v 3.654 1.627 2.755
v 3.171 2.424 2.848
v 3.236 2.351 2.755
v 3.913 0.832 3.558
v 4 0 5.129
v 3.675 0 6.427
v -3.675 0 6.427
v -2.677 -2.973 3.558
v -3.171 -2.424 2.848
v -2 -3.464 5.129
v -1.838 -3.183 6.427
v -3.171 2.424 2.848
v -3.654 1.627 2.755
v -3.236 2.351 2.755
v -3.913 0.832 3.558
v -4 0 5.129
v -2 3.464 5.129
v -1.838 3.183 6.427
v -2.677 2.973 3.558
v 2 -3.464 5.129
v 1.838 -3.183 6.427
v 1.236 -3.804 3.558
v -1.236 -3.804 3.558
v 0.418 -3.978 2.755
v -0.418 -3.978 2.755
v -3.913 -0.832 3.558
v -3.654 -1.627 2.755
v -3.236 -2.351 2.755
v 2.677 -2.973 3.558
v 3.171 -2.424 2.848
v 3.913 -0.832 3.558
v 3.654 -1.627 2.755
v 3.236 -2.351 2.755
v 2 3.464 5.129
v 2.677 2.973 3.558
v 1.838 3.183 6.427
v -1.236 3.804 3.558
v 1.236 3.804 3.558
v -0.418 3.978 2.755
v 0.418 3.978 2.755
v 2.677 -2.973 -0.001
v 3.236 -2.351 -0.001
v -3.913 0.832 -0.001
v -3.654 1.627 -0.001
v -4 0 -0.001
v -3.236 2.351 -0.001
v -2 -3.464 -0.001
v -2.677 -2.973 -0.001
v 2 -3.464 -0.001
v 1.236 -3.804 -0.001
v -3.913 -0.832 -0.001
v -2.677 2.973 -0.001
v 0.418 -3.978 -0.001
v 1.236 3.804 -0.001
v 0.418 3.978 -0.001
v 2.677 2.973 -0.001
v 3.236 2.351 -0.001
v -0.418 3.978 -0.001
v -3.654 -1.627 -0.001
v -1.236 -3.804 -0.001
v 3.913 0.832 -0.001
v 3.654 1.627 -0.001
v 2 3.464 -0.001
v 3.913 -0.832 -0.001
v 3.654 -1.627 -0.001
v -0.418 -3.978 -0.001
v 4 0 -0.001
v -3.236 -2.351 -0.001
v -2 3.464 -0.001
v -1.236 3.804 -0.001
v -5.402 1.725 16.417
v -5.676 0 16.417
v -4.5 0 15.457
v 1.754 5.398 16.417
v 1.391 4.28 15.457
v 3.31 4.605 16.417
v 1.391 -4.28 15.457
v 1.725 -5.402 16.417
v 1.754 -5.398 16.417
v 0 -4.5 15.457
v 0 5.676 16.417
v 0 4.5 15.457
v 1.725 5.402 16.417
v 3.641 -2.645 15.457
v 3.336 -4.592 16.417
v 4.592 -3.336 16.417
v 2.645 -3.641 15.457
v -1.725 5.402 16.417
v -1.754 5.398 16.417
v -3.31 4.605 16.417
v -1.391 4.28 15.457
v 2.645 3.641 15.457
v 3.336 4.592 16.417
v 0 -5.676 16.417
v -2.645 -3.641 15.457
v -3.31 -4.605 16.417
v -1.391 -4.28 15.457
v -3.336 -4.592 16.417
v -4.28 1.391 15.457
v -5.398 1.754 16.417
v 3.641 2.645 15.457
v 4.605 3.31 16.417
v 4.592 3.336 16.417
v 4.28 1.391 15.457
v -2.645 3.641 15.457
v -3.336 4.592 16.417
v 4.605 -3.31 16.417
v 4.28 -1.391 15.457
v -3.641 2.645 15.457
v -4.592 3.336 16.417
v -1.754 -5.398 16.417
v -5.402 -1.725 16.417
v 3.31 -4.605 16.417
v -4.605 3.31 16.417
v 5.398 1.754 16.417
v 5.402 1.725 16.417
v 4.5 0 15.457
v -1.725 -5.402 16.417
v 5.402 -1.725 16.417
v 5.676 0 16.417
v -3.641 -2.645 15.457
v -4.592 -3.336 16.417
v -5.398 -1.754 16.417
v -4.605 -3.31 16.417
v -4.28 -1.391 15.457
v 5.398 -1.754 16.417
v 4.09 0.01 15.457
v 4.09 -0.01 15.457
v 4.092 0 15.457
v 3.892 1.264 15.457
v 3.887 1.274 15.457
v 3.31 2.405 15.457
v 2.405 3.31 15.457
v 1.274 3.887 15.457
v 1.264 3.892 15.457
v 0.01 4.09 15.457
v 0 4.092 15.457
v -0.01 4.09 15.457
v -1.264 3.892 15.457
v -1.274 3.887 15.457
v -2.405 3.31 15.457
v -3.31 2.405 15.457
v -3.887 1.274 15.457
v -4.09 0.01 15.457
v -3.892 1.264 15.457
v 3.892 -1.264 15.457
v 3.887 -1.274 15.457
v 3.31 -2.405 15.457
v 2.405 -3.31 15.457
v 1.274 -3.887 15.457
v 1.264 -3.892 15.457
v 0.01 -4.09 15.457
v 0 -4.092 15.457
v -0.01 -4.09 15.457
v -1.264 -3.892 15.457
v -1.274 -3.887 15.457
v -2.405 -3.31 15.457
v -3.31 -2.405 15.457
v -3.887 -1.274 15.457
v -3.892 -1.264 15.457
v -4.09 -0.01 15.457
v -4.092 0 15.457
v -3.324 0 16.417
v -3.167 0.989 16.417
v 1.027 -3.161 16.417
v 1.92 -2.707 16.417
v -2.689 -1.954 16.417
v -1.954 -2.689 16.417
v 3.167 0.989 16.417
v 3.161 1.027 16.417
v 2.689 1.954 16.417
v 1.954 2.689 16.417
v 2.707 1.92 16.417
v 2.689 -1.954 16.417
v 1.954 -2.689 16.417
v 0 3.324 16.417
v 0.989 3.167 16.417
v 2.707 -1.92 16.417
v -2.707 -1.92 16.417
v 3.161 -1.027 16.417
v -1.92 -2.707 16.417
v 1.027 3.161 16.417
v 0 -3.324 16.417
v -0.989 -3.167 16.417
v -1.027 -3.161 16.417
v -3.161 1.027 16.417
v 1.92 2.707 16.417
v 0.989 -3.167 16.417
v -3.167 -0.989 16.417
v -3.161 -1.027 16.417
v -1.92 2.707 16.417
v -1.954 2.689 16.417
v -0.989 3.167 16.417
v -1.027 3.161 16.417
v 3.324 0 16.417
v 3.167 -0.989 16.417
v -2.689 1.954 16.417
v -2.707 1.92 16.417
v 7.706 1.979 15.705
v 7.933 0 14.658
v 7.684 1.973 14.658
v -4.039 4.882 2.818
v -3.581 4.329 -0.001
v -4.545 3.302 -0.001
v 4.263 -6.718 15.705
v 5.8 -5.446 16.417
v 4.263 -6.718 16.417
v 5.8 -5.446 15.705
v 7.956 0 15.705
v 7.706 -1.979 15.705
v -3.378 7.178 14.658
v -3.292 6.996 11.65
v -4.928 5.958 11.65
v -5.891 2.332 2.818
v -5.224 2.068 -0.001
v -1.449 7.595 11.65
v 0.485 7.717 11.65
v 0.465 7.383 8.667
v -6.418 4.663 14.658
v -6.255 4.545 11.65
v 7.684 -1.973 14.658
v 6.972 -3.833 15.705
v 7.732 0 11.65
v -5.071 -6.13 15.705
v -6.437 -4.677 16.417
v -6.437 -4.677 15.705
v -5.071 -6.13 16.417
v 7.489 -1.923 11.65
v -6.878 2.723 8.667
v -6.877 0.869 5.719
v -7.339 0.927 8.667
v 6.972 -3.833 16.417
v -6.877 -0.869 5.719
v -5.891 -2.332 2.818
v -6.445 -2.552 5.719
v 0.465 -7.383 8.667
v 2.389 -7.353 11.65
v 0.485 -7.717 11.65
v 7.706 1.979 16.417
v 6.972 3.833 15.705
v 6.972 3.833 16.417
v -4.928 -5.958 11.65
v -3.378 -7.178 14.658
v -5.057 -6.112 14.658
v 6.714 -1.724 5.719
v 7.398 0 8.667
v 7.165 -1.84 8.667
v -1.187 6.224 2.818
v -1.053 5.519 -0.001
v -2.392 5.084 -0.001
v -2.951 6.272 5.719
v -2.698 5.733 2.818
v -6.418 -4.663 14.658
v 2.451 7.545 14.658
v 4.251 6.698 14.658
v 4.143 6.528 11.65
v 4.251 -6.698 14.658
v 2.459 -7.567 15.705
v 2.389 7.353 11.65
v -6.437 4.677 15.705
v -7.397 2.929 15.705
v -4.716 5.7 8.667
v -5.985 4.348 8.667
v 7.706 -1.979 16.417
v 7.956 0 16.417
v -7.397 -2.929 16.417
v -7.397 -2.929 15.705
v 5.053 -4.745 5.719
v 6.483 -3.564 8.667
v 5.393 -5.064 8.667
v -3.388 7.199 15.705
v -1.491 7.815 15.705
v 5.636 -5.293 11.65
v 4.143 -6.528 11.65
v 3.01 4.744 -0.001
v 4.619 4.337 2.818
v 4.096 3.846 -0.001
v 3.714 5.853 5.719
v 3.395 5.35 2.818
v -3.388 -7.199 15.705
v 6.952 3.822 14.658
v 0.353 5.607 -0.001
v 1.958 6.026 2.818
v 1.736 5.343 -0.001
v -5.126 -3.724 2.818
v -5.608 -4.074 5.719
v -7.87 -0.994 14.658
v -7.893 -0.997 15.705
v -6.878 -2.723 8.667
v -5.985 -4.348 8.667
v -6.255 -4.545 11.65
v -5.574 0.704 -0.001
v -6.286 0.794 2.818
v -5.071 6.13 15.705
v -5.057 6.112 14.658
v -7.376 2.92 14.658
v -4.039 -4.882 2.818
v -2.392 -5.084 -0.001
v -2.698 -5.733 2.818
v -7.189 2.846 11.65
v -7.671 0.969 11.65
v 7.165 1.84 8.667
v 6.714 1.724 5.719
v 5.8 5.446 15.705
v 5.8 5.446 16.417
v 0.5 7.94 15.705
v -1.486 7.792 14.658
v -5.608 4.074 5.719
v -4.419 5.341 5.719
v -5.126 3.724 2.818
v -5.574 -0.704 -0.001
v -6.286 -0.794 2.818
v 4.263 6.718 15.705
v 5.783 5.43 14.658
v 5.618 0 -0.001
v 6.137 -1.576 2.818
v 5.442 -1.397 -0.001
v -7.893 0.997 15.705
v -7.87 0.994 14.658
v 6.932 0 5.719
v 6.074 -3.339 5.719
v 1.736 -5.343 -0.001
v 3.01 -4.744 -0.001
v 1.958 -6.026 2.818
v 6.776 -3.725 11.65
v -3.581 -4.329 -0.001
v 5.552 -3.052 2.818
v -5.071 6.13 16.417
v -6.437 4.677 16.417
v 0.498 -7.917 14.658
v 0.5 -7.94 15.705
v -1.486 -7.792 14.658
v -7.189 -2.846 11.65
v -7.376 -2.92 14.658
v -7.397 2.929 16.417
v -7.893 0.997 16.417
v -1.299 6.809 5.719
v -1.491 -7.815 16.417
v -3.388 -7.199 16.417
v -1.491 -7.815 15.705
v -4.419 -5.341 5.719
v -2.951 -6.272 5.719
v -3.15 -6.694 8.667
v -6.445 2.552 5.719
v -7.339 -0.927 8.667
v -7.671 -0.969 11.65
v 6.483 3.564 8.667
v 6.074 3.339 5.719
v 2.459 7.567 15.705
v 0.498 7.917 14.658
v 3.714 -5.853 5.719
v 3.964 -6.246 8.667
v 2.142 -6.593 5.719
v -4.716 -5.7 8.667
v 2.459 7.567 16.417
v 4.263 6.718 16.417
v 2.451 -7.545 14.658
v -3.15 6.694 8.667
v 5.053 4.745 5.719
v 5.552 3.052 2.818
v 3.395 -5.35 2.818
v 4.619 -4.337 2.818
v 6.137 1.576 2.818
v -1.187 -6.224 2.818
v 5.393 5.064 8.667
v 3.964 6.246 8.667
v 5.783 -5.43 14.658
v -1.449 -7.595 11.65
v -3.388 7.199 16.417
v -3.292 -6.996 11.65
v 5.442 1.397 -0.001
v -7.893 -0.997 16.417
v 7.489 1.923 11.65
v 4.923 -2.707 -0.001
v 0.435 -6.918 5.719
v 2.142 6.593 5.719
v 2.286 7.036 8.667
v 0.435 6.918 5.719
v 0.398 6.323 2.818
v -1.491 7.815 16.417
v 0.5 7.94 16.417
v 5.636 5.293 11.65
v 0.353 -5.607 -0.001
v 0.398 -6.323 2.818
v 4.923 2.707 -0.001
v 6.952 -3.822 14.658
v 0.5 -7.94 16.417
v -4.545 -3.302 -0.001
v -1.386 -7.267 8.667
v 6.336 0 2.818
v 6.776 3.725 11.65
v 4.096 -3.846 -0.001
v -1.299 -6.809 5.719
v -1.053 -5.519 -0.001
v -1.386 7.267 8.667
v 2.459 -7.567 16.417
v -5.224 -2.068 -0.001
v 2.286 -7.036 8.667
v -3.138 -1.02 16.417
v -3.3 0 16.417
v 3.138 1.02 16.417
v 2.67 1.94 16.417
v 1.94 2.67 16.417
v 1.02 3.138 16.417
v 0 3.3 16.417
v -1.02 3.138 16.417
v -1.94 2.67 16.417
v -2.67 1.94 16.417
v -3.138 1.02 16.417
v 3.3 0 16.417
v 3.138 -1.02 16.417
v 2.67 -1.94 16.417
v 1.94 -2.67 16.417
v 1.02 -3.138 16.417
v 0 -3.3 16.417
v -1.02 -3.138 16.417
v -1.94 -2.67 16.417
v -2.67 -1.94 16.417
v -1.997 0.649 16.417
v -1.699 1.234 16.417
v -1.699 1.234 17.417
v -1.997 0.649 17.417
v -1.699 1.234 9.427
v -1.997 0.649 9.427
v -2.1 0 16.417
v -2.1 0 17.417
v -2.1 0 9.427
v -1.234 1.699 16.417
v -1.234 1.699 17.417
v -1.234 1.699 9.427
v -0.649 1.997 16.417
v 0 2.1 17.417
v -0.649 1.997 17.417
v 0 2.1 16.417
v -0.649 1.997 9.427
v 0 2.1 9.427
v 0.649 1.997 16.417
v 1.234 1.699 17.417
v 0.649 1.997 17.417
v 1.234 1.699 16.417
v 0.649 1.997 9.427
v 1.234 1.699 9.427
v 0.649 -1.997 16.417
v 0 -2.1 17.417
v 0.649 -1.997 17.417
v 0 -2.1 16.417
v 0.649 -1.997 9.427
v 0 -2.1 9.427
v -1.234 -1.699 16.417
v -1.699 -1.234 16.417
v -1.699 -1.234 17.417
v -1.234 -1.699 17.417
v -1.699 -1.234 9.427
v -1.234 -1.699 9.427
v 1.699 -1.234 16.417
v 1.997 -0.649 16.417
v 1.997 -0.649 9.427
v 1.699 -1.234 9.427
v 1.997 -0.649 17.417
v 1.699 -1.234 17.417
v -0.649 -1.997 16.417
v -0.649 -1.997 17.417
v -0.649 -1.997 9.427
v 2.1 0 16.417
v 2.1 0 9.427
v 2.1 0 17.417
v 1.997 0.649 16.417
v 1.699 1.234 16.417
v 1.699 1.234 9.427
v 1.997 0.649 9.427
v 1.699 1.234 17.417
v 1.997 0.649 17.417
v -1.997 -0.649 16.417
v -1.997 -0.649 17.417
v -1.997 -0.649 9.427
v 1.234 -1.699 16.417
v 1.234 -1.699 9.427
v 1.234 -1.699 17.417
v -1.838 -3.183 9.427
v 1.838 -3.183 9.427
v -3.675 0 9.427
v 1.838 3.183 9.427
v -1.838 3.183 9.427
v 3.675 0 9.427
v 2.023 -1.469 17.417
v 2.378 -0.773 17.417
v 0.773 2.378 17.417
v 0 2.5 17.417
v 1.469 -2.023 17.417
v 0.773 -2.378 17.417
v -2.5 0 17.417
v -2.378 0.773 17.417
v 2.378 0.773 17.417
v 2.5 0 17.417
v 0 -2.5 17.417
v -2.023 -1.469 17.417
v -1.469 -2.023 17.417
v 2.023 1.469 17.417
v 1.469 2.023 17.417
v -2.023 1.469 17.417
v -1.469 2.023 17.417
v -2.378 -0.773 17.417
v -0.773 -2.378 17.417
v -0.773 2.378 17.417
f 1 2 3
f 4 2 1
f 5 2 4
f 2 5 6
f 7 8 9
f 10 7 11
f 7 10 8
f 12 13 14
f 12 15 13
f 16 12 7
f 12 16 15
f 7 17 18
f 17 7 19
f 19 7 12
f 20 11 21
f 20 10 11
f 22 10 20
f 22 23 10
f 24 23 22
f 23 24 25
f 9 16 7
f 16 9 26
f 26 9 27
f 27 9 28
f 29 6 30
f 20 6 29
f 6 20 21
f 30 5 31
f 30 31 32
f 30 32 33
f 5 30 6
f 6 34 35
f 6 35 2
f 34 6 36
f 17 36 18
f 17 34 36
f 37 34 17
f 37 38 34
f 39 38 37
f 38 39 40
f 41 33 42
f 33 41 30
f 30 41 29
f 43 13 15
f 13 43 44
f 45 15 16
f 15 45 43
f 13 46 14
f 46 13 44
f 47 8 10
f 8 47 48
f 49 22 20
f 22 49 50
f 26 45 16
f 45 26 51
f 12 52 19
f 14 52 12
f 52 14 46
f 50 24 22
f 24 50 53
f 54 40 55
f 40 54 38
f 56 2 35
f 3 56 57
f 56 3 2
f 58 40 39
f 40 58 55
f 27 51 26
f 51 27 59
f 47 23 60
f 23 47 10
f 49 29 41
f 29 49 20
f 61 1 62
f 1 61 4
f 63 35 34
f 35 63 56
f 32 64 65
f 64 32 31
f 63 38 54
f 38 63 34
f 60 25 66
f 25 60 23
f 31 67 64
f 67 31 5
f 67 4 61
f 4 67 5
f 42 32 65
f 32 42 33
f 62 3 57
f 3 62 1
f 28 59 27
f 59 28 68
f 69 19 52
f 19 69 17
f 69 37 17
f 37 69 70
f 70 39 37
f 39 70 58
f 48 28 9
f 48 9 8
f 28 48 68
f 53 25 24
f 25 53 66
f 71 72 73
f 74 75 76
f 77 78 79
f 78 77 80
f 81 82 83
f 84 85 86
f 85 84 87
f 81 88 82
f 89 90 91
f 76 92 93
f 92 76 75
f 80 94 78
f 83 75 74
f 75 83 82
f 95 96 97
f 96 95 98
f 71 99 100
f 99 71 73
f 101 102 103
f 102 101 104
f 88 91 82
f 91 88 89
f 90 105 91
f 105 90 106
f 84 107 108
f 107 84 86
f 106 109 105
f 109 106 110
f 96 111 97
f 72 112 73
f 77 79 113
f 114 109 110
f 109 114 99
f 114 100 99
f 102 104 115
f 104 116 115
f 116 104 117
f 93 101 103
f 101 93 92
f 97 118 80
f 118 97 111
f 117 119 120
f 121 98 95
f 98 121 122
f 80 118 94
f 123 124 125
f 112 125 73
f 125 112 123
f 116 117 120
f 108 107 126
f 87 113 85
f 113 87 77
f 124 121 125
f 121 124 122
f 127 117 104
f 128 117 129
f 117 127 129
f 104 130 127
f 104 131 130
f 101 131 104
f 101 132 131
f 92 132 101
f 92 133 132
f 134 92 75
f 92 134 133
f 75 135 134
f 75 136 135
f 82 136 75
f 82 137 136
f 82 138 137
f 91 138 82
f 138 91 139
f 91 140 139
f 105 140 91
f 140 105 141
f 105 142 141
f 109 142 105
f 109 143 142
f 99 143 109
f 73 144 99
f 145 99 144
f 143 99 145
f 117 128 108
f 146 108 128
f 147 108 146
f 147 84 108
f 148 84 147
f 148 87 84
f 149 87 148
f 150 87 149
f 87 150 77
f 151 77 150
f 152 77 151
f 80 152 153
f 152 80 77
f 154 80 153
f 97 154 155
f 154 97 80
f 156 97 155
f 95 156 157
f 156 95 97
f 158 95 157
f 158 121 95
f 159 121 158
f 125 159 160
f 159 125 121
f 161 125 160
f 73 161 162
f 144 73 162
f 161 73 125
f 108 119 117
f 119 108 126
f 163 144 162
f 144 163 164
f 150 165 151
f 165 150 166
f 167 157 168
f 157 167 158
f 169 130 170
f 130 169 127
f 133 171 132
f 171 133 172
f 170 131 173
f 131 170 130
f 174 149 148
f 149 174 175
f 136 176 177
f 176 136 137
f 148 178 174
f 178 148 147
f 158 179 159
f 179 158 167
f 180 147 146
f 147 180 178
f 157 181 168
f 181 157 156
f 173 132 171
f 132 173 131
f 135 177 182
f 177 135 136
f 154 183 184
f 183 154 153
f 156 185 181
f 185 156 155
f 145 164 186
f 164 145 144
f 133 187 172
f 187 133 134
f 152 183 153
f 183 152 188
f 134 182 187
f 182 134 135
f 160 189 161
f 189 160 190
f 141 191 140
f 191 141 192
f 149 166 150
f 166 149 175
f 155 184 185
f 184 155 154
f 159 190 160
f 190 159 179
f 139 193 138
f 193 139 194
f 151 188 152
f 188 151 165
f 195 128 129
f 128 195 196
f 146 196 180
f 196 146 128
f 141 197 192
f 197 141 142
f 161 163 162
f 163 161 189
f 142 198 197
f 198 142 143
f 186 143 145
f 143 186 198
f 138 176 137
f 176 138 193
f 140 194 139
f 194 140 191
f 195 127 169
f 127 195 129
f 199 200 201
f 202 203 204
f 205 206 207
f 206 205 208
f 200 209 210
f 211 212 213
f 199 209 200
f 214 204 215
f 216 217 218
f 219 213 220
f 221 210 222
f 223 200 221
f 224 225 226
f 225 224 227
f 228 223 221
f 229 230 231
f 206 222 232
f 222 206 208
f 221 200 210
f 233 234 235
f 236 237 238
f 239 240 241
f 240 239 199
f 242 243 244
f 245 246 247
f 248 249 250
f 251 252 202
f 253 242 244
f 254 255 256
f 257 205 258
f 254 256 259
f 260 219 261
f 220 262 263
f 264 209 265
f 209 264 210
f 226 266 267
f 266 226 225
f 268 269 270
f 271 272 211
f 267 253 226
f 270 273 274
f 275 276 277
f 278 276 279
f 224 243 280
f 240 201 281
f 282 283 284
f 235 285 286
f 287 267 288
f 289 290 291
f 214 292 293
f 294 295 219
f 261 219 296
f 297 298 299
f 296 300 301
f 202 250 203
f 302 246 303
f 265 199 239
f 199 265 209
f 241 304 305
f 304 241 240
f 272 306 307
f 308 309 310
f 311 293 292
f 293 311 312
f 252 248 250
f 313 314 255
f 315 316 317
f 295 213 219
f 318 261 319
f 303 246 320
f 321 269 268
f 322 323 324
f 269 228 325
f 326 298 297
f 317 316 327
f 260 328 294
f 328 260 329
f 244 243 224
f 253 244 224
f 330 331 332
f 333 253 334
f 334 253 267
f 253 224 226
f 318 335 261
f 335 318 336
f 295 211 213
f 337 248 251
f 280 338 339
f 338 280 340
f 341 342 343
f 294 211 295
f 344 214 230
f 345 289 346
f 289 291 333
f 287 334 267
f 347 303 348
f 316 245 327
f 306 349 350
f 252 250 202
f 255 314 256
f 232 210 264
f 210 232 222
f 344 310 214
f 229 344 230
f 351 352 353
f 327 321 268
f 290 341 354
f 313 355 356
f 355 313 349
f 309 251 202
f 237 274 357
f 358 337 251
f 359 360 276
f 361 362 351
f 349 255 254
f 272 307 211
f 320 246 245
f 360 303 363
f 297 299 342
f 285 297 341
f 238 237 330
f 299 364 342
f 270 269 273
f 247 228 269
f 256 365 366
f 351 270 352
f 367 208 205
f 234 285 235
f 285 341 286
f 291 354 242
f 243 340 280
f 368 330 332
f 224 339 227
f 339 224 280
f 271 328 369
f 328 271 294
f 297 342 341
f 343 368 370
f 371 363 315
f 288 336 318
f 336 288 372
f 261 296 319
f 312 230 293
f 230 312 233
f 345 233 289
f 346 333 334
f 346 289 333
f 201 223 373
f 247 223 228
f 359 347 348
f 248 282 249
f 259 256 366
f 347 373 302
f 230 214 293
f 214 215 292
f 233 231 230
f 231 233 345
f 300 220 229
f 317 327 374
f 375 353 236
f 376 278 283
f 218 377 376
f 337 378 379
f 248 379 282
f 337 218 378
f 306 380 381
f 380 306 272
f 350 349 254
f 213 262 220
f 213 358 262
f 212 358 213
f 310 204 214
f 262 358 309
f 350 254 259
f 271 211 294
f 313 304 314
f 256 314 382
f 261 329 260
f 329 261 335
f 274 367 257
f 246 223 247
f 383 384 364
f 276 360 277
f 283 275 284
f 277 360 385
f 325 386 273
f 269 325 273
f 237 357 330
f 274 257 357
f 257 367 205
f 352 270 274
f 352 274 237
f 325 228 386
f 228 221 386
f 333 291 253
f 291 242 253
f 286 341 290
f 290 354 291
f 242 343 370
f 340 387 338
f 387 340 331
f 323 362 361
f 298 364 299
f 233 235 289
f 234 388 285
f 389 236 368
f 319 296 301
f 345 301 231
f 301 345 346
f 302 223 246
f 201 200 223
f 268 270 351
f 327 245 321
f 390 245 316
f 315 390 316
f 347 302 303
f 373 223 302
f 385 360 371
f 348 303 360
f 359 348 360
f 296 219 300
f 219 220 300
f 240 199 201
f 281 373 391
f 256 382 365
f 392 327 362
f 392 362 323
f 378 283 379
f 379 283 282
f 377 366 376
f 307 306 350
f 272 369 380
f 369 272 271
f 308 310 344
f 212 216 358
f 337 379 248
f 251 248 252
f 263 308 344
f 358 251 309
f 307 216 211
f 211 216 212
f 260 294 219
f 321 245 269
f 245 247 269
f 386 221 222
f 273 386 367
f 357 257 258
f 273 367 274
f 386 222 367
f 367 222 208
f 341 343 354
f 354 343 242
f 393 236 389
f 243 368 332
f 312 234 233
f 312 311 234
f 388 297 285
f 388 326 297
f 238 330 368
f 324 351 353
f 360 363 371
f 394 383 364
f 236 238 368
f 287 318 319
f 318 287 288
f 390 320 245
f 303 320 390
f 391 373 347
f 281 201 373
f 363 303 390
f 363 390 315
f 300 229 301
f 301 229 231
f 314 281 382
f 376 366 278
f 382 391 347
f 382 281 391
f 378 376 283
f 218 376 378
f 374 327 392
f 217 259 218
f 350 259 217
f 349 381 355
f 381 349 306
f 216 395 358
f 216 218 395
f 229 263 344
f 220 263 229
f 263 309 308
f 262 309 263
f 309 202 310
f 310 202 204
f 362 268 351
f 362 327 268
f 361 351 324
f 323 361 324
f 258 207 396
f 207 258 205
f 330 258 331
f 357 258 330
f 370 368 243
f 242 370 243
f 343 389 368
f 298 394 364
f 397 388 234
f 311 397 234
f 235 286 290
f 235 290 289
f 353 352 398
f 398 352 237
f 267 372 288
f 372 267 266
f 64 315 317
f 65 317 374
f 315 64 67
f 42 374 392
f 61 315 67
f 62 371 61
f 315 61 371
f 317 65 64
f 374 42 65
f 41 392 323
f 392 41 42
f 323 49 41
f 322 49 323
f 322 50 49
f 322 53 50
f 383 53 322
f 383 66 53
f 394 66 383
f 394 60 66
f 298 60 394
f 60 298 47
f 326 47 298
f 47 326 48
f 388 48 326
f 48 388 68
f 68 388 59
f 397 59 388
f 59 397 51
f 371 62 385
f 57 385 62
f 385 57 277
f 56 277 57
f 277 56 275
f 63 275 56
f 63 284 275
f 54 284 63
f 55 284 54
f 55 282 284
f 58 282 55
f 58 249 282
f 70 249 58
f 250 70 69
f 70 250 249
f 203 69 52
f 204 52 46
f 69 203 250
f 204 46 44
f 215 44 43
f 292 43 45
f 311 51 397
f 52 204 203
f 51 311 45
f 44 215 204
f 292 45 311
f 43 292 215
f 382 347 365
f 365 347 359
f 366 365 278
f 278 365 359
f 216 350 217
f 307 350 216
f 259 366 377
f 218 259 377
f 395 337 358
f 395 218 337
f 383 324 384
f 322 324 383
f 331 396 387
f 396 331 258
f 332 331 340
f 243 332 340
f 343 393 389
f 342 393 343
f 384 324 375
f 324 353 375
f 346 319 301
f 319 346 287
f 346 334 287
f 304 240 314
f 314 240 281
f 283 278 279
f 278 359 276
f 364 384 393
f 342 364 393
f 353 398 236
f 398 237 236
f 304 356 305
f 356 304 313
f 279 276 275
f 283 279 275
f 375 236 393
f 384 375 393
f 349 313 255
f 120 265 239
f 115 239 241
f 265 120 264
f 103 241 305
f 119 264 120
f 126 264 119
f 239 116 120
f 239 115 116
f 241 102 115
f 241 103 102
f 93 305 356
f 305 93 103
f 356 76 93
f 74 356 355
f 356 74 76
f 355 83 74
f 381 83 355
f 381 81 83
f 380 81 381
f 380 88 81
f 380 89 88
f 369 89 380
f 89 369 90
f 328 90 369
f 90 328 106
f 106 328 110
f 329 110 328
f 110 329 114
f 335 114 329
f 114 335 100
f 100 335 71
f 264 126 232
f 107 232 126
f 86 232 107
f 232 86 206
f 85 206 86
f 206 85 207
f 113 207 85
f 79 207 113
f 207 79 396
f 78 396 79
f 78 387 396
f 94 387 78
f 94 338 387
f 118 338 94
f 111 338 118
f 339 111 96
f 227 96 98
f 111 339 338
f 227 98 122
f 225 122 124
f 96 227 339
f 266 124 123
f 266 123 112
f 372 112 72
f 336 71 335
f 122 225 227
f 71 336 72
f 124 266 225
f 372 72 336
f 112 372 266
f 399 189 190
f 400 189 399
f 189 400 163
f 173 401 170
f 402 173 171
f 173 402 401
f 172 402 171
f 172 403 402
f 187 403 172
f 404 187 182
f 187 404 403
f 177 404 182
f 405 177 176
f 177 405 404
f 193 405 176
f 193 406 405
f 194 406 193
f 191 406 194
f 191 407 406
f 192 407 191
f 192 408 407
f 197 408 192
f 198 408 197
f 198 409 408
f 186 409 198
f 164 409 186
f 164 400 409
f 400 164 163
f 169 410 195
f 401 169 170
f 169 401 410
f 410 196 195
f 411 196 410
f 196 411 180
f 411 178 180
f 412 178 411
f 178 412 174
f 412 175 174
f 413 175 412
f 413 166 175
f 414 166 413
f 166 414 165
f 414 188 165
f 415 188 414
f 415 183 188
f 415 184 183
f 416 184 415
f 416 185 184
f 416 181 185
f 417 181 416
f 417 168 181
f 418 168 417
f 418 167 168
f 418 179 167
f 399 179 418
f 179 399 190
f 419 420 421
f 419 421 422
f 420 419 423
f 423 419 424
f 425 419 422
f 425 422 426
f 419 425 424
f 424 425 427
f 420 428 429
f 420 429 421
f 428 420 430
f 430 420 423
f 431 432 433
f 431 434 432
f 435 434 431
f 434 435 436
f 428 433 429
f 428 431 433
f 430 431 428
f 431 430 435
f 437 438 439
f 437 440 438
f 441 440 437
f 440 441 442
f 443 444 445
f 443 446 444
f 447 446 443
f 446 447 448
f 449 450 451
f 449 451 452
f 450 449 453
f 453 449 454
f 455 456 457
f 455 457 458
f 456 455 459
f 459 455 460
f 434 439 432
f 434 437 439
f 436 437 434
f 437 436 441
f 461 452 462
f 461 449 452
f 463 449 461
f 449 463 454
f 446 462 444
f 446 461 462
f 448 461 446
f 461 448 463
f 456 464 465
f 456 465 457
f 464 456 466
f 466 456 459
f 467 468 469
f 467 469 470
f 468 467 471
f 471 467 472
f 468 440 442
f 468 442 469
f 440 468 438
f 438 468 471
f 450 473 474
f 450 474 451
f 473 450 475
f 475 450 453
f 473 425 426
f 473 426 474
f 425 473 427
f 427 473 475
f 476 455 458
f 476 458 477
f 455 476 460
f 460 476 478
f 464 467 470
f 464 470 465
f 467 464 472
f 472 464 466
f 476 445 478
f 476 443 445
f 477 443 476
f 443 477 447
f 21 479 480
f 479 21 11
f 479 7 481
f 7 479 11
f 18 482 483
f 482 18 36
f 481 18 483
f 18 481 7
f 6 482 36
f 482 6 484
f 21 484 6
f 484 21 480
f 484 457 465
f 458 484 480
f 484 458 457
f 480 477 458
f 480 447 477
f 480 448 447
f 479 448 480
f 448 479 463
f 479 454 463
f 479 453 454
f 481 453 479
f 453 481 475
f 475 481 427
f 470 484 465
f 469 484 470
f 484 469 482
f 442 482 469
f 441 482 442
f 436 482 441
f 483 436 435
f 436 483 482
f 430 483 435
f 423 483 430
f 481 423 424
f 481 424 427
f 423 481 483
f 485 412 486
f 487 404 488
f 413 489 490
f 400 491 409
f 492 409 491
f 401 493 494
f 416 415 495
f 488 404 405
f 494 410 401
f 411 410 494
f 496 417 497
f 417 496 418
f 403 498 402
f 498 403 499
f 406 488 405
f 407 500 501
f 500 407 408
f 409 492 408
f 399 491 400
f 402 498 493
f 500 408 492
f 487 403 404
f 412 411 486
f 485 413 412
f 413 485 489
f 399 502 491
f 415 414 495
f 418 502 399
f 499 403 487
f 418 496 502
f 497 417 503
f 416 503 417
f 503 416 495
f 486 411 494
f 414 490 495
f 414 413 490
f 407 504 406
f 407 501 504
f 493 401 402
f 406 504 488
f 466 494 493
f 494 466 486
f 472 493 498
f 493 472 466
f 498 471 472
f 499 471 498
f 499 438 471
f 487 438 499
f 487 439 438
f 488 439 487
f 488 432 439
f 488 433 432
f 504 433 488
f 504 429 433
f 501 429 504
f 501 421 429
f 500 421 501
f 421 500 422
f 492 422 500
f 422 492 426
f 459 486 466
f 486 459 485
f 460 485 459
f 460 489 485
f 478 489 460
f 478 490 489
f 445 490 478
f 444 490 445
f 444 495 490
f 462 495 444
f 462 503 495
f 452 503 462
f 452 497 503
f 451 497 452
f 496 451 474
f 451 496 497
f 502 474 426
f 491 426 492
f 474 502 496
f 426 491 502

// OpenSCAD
// file: wheel_parameters.scad
// wheel_parameters.scad
//
// This is a component of a tool to generate Mecanum wheels that meet a variety of
// parameters set in the wheel_parameters.scad file. 
//
// This file contains all the driving parameters for generating the wheel rollers and hub. 
//
// Because of the large number of parameters and the relatively tight constraints of
// mecanum wheels, it takes some tuning to get something that's mechanically workable.
// However, it's easy to change values and watch the entire assembly preview change in
// hub.scad, so the process is not too painful!
//
// By Gregg Christopher, 2015
// This file is public domain. 

// Small "epsilon" value for ensuring manifold geometry. "slop" is easier to type than "manifold."
slop = 0.01;

/* [Main Dimensions] */
// Distance from the hub axle center to the center of the axles of each roller.
wheel_axle_radius = 26;
// Angle of rollers relative to the hub axle. Change this and they're probably not mecanum wheels anymore. 
wheel_angle = 45;
// Number of roller spokes on the hub. 
num_wheels = 7;

// This example is for MR63ZZ bearings, because they are cheap to buy and mecanum wheels use a lot of them.
/* [Bearing Dimensions] */
// Inner diameter of bearing. 
bearing_inner_diameter = 3;
// Outer diameter of bearing, plus extra clearance for printing. Should be a snug fit.
bearing_outer_diameter = 6 + 0.2;
// Width of bearing. 
bearing_width = 2.5;
// Thickness of printed part holding the bearing in place. 
bearing_holder_width = 3;

/* [Bearing Spacer Dimensions] */
// Width of the bearing spacer at the point where it contacts the bearing.
bearing_inner_contact_min_width = 0.4;
// Width of the spacer when at the roller.
bearing_inner_contact_max_width = 1.2;
// Height of the spacer (distance from the bearing to the main body of he roller.
bearing_inner_contact_height = 1.0;

/* [Wheel Hub Dimensions] */
// Outer radius of the main hub holding the roller wheel spokes. Needs to be small enough to allow clearance for the rollers. 
hub_outer_radius = 15;
// Thickness of the hub wheel. 
hub_thickness = 3;

// Amount to trim off outer edge of hub to make it more printable.
hub_printing_trim = 1; 

// Distance from edge of hub to motor. (Clearance for the rollers to spin without hitting the motor or frame.)
hub_motor_distance = 12; 

/* [Hub Inner Spoke Dimensions] */
// Thickness of the angled spoke from the inner hub to the motor shaft holder.
hub_spoke_thickness = 2.5;
// Number of inner spokes. Does not have to be the same as the number of wheel rollers. 
num_spokes = 7;

/* [Motor Shaft Dimensions] */
// Radius of the solid piece holding the motor shaft, this forms the inner axle of the wheel hub. 
motor_attachment_radius = 4;
// Radius of the motor shaft. Extra clearnace for printing is added in this example. 
motor_shaft_r = 1.5 + 0.5;
// Amount to cut off a keyed motor shaft. Extra added to make it more snug in this example. Ideally pressure-fit, unless a set screw or glue is used. 
motor_shaft_key_inset = 0.5 + 0.2; 
// Length of motor shaft holder. 
motor_shaft_length = 9;

// Please disregard that these variable are prefixed "m3". That's just the size the first version was using. 
// These are more arbitrary parameters that can be changed. 
/* [Roller Screw Axle Dimensions] */
// Radius of the screw. (extra size for printing clearance is added in this example.)
m3_screw_r = 1.5 + 0.6;
m3_screw_shaft_length = 20; // Not counting length of head and nut, add 5mm to actual screw length.
// Radius of the nut is calculated to be the circle containing the nut, plus some extra print clearance. 
m3_nut_radius = 5.5 /2 / cos(30) + 0.5;
// Depth of the captive nut holder in the roller piece. 
m3_nut_holder_depth = 3;
// Overall thickness of the solid portion of the roller between the nut and the bearing spacer. 
m3_nut_holder_thickness = 7;
// Captive nut holder widens at the end of the roller to this radius to ease insertion of the nut.
m3_entrance_clearance_r = 4;

// Calculate the thickness of the main hub section that holds the angled outer hub spokes.
wheel_attachment_thickness = (bearing_outer_diameter + bearing_holder_width*2) * sin(wheel_angle) +
                             bearing_width * sin(wheel_angle);
echo(wheel_attachment_thickness);

// Width of the virtual wheel outline filled by the mecanum wheels.
contact_shape_thickness = 25;
// Height (radial measurement) of the virtual wheel outline filled by the mecanum wheels.
contact_shape_height = 16;

// Preview a sample bearing.
// Note that the bearing previewed here does not scale with parameters.
// If you want to see how a different bearing fits, replace this module. 
// This is included as a demonstration for a particular wheel size. It does not scale with other parameters. 
module MR63ZZ_bearing() {
  difference() {
    cylinder(r = bearing_outer_diameter/2, h = bearing_width, center = true, $fn = 30);
    cylinder(r = bearing_inner_diameter/2, h = bearing_width + 2*slop, center = true, $fn = 20);
  }
}
// main file
// wheel_shape.scad
//
// This is a component of a tool to generate Mecanum wheels that meet a variety of
// parameters set in the wheel_parameters.scad file. 
//
// This file generates the shape of a single wheel spoke roller piece (1/2 of a roller) for
// a mecanum wheel. It attempts to shape the spoke to conform to a "virtual wheel" shape
// that is extruded in a circle around the shaft of the wheel, so that when the spokes rotate
// around their individual shafts while the wheel is spinning, the effective possible 
// contact surface with the ground is very close to that virtual wheel shape. 
//
// This is accomplished by taking the intersection of a cylinder defining the possible
// volume of the spoke, and intersecting it with the virtual wheel shape. A slice of
// that intersection is chosen heuristically (i.e. I hardcoded some math/guesswork),
// and that slice is then rotationally extruded to make the spoke shape. 
//
// A few other geometric features, like a bearing spacer and captive nut holder for]
// using a screw as an axle, are then added/cut into the spoke. 
//
// Much more sophisticated approaches are possible, but surprisingly, this simplistic
// approach produced great results for the configurations I tried.
//
// Because of the large number of parameters and the relatively tight constraints of
// mecanum wheels, it takes some tuning to get something that's mechanically workable.
// However, it's easy to change values and watch the entire assembly preview change in
// hub.scad, so the process is not too painful!
//
// By Gregg Christopher, 2015
// This file is public domain. 

include <wheel_parameters.scad>

// Create a 2D shape that will define the "virtual wheel" to which the rollers will
// attempt to conform. Try different shapes to see weird results!
// y = radial dimension
module wheel_shape_2d() {
  // As an example, uncomment the next two lines to test making rollers with
  // very rounded ends to make a less square wheel cross-section. 
  // Warning! This particular shape increases the poly count, and SCAD might
  // be prohibitively slow.
  //offset(r = 4)
  //offset(r = -4)
  square([contact_shape_height, contact_shape_thickness], center = true);
}

// Calculate intersection points to determine an angle to take a slice of the
// wheel profile. This is not remotely an optimal or particularly elegant solution,
// but it worked well for the wheels I wanted to make. 
x1 = cos(wheel_angle) * contact_shape_height/2;
y1 = sin(wheel_angle) * contact_shape_height/2;

y2 = y1 + contact_shape_thickness/2;
x2 = tan(wheel_angle) * y2;

cross_section_angle = atan(contact_shape_thickness/2 / (x1 + x2));

echo(x1);
echo(x2);
echo(y1);
echo(y2);
echo(cross_section_angle);

module mecanum_wheel_shape_3d() {
  difference() {
    // Create the base spoke shape
    rotate_extrude()
    rotate([180, 0, 90])
    intersection() {
      square([100, 100]);
      // Take a slice of the intersection of the virtual wheel and allowable spoke cylinder. 
      projection(cut = true) 
      rotate([0, 45, 0])
      intersection() {
        translate([0, -wheel_axle_radius, 0])
        rotate_extrude($fn = 100)
        translate([wheel_axle_radius, 0, 0])
        wheel_shape_2d();
        
        rotate([0, wheel_angle, 0])
        cylinder(r = contact_shape_height/2, h = 50, center = true, $fn = 30);
      }
    }
    translate([0, 0, -slop]) cylinder(r = 20, h = bearing_width/2 + 2*slop); // Remove material for hub
    translate([0, 0, bearing_width/2]) cylinder(r = m3_screw_r, h = m3_nut_holder_thickness + slop, $fn = 20); // Screw hole
    translate([0, 0, bearing_width/2 + m3_nut_holder_thickness]) cylinder(r = m3_nut_radius, h = m3_nut_holder_depth + slop, $fn = 6); // Nut holder hole
    // Cutout for screw and nut at the end of the roller. 
    translate([0, 0, bearing_width/2 + m3_nut_holder_thickness + m3_nut_holder_depth])
    intersection() {
       remaining_height = x2 - bearing_width/2 - m3_nut_holder_thickness - m3_nut_holder_depth;
       cylinder(r1 = m3_nut_radius, r2 = m3_nut_radius + remaining_height/4, h = remaining_height, $fn = 6);
       cylinder(r = m3_entrance_clearance_r, h = remaining_height, $fn = 30);
    }
    // Cut out some extra clearance around the bearing spacer.
    // This cavity will collect fluff and other junk forever. It's great. 
    translate([0, 0, bearing_width/2 - slop])
    difference() {
      cylinder(r1 = contact_shape_height/2 - 3.5 + bearing_inner_contact_max_width, r2 = contact_shape_height/2 - 3.5, h = bearing_inner_contact_height - 2*slop, $fn = 20); // Screw hole
      translate([0, 0, -slop]) cylinder(r1 = m3_screw_r + bearing_inner_contact_max_width, r2 = m3_screw_r + 2*bearing_inner_contact_max_width - bearing_inner_contact_min_width, h = bearing_inner_contact_height, $fn = 20); // Screw hole
    }
  }
  // Bearing spacer. Larger designs might want to omit this and go with a manufactured spacer matching the selected bearing. 
  translate([0, 0, bearing_width/2 - bearing_inner_contact_height + slop])
  difference() {
    cylinder(r1 = m3_screw_r + bearing_inner_contact_min_width, r2 = m3_screw_r + bearing_inner_contact_max_width, h = bearing_inner_contact_height, $fn = 20);
    translate([0, 0, -slop]) cylinder(r = m3_screw_r, h = bearing_inner_contact_height + 2*slop, $fn = 20);
  }
}

// Position the roller spoke half for printing
rotate([0, 180, 0])
translate([0, 0, -x2 + 0.48])
mecanum_wheel_shape_3d();
